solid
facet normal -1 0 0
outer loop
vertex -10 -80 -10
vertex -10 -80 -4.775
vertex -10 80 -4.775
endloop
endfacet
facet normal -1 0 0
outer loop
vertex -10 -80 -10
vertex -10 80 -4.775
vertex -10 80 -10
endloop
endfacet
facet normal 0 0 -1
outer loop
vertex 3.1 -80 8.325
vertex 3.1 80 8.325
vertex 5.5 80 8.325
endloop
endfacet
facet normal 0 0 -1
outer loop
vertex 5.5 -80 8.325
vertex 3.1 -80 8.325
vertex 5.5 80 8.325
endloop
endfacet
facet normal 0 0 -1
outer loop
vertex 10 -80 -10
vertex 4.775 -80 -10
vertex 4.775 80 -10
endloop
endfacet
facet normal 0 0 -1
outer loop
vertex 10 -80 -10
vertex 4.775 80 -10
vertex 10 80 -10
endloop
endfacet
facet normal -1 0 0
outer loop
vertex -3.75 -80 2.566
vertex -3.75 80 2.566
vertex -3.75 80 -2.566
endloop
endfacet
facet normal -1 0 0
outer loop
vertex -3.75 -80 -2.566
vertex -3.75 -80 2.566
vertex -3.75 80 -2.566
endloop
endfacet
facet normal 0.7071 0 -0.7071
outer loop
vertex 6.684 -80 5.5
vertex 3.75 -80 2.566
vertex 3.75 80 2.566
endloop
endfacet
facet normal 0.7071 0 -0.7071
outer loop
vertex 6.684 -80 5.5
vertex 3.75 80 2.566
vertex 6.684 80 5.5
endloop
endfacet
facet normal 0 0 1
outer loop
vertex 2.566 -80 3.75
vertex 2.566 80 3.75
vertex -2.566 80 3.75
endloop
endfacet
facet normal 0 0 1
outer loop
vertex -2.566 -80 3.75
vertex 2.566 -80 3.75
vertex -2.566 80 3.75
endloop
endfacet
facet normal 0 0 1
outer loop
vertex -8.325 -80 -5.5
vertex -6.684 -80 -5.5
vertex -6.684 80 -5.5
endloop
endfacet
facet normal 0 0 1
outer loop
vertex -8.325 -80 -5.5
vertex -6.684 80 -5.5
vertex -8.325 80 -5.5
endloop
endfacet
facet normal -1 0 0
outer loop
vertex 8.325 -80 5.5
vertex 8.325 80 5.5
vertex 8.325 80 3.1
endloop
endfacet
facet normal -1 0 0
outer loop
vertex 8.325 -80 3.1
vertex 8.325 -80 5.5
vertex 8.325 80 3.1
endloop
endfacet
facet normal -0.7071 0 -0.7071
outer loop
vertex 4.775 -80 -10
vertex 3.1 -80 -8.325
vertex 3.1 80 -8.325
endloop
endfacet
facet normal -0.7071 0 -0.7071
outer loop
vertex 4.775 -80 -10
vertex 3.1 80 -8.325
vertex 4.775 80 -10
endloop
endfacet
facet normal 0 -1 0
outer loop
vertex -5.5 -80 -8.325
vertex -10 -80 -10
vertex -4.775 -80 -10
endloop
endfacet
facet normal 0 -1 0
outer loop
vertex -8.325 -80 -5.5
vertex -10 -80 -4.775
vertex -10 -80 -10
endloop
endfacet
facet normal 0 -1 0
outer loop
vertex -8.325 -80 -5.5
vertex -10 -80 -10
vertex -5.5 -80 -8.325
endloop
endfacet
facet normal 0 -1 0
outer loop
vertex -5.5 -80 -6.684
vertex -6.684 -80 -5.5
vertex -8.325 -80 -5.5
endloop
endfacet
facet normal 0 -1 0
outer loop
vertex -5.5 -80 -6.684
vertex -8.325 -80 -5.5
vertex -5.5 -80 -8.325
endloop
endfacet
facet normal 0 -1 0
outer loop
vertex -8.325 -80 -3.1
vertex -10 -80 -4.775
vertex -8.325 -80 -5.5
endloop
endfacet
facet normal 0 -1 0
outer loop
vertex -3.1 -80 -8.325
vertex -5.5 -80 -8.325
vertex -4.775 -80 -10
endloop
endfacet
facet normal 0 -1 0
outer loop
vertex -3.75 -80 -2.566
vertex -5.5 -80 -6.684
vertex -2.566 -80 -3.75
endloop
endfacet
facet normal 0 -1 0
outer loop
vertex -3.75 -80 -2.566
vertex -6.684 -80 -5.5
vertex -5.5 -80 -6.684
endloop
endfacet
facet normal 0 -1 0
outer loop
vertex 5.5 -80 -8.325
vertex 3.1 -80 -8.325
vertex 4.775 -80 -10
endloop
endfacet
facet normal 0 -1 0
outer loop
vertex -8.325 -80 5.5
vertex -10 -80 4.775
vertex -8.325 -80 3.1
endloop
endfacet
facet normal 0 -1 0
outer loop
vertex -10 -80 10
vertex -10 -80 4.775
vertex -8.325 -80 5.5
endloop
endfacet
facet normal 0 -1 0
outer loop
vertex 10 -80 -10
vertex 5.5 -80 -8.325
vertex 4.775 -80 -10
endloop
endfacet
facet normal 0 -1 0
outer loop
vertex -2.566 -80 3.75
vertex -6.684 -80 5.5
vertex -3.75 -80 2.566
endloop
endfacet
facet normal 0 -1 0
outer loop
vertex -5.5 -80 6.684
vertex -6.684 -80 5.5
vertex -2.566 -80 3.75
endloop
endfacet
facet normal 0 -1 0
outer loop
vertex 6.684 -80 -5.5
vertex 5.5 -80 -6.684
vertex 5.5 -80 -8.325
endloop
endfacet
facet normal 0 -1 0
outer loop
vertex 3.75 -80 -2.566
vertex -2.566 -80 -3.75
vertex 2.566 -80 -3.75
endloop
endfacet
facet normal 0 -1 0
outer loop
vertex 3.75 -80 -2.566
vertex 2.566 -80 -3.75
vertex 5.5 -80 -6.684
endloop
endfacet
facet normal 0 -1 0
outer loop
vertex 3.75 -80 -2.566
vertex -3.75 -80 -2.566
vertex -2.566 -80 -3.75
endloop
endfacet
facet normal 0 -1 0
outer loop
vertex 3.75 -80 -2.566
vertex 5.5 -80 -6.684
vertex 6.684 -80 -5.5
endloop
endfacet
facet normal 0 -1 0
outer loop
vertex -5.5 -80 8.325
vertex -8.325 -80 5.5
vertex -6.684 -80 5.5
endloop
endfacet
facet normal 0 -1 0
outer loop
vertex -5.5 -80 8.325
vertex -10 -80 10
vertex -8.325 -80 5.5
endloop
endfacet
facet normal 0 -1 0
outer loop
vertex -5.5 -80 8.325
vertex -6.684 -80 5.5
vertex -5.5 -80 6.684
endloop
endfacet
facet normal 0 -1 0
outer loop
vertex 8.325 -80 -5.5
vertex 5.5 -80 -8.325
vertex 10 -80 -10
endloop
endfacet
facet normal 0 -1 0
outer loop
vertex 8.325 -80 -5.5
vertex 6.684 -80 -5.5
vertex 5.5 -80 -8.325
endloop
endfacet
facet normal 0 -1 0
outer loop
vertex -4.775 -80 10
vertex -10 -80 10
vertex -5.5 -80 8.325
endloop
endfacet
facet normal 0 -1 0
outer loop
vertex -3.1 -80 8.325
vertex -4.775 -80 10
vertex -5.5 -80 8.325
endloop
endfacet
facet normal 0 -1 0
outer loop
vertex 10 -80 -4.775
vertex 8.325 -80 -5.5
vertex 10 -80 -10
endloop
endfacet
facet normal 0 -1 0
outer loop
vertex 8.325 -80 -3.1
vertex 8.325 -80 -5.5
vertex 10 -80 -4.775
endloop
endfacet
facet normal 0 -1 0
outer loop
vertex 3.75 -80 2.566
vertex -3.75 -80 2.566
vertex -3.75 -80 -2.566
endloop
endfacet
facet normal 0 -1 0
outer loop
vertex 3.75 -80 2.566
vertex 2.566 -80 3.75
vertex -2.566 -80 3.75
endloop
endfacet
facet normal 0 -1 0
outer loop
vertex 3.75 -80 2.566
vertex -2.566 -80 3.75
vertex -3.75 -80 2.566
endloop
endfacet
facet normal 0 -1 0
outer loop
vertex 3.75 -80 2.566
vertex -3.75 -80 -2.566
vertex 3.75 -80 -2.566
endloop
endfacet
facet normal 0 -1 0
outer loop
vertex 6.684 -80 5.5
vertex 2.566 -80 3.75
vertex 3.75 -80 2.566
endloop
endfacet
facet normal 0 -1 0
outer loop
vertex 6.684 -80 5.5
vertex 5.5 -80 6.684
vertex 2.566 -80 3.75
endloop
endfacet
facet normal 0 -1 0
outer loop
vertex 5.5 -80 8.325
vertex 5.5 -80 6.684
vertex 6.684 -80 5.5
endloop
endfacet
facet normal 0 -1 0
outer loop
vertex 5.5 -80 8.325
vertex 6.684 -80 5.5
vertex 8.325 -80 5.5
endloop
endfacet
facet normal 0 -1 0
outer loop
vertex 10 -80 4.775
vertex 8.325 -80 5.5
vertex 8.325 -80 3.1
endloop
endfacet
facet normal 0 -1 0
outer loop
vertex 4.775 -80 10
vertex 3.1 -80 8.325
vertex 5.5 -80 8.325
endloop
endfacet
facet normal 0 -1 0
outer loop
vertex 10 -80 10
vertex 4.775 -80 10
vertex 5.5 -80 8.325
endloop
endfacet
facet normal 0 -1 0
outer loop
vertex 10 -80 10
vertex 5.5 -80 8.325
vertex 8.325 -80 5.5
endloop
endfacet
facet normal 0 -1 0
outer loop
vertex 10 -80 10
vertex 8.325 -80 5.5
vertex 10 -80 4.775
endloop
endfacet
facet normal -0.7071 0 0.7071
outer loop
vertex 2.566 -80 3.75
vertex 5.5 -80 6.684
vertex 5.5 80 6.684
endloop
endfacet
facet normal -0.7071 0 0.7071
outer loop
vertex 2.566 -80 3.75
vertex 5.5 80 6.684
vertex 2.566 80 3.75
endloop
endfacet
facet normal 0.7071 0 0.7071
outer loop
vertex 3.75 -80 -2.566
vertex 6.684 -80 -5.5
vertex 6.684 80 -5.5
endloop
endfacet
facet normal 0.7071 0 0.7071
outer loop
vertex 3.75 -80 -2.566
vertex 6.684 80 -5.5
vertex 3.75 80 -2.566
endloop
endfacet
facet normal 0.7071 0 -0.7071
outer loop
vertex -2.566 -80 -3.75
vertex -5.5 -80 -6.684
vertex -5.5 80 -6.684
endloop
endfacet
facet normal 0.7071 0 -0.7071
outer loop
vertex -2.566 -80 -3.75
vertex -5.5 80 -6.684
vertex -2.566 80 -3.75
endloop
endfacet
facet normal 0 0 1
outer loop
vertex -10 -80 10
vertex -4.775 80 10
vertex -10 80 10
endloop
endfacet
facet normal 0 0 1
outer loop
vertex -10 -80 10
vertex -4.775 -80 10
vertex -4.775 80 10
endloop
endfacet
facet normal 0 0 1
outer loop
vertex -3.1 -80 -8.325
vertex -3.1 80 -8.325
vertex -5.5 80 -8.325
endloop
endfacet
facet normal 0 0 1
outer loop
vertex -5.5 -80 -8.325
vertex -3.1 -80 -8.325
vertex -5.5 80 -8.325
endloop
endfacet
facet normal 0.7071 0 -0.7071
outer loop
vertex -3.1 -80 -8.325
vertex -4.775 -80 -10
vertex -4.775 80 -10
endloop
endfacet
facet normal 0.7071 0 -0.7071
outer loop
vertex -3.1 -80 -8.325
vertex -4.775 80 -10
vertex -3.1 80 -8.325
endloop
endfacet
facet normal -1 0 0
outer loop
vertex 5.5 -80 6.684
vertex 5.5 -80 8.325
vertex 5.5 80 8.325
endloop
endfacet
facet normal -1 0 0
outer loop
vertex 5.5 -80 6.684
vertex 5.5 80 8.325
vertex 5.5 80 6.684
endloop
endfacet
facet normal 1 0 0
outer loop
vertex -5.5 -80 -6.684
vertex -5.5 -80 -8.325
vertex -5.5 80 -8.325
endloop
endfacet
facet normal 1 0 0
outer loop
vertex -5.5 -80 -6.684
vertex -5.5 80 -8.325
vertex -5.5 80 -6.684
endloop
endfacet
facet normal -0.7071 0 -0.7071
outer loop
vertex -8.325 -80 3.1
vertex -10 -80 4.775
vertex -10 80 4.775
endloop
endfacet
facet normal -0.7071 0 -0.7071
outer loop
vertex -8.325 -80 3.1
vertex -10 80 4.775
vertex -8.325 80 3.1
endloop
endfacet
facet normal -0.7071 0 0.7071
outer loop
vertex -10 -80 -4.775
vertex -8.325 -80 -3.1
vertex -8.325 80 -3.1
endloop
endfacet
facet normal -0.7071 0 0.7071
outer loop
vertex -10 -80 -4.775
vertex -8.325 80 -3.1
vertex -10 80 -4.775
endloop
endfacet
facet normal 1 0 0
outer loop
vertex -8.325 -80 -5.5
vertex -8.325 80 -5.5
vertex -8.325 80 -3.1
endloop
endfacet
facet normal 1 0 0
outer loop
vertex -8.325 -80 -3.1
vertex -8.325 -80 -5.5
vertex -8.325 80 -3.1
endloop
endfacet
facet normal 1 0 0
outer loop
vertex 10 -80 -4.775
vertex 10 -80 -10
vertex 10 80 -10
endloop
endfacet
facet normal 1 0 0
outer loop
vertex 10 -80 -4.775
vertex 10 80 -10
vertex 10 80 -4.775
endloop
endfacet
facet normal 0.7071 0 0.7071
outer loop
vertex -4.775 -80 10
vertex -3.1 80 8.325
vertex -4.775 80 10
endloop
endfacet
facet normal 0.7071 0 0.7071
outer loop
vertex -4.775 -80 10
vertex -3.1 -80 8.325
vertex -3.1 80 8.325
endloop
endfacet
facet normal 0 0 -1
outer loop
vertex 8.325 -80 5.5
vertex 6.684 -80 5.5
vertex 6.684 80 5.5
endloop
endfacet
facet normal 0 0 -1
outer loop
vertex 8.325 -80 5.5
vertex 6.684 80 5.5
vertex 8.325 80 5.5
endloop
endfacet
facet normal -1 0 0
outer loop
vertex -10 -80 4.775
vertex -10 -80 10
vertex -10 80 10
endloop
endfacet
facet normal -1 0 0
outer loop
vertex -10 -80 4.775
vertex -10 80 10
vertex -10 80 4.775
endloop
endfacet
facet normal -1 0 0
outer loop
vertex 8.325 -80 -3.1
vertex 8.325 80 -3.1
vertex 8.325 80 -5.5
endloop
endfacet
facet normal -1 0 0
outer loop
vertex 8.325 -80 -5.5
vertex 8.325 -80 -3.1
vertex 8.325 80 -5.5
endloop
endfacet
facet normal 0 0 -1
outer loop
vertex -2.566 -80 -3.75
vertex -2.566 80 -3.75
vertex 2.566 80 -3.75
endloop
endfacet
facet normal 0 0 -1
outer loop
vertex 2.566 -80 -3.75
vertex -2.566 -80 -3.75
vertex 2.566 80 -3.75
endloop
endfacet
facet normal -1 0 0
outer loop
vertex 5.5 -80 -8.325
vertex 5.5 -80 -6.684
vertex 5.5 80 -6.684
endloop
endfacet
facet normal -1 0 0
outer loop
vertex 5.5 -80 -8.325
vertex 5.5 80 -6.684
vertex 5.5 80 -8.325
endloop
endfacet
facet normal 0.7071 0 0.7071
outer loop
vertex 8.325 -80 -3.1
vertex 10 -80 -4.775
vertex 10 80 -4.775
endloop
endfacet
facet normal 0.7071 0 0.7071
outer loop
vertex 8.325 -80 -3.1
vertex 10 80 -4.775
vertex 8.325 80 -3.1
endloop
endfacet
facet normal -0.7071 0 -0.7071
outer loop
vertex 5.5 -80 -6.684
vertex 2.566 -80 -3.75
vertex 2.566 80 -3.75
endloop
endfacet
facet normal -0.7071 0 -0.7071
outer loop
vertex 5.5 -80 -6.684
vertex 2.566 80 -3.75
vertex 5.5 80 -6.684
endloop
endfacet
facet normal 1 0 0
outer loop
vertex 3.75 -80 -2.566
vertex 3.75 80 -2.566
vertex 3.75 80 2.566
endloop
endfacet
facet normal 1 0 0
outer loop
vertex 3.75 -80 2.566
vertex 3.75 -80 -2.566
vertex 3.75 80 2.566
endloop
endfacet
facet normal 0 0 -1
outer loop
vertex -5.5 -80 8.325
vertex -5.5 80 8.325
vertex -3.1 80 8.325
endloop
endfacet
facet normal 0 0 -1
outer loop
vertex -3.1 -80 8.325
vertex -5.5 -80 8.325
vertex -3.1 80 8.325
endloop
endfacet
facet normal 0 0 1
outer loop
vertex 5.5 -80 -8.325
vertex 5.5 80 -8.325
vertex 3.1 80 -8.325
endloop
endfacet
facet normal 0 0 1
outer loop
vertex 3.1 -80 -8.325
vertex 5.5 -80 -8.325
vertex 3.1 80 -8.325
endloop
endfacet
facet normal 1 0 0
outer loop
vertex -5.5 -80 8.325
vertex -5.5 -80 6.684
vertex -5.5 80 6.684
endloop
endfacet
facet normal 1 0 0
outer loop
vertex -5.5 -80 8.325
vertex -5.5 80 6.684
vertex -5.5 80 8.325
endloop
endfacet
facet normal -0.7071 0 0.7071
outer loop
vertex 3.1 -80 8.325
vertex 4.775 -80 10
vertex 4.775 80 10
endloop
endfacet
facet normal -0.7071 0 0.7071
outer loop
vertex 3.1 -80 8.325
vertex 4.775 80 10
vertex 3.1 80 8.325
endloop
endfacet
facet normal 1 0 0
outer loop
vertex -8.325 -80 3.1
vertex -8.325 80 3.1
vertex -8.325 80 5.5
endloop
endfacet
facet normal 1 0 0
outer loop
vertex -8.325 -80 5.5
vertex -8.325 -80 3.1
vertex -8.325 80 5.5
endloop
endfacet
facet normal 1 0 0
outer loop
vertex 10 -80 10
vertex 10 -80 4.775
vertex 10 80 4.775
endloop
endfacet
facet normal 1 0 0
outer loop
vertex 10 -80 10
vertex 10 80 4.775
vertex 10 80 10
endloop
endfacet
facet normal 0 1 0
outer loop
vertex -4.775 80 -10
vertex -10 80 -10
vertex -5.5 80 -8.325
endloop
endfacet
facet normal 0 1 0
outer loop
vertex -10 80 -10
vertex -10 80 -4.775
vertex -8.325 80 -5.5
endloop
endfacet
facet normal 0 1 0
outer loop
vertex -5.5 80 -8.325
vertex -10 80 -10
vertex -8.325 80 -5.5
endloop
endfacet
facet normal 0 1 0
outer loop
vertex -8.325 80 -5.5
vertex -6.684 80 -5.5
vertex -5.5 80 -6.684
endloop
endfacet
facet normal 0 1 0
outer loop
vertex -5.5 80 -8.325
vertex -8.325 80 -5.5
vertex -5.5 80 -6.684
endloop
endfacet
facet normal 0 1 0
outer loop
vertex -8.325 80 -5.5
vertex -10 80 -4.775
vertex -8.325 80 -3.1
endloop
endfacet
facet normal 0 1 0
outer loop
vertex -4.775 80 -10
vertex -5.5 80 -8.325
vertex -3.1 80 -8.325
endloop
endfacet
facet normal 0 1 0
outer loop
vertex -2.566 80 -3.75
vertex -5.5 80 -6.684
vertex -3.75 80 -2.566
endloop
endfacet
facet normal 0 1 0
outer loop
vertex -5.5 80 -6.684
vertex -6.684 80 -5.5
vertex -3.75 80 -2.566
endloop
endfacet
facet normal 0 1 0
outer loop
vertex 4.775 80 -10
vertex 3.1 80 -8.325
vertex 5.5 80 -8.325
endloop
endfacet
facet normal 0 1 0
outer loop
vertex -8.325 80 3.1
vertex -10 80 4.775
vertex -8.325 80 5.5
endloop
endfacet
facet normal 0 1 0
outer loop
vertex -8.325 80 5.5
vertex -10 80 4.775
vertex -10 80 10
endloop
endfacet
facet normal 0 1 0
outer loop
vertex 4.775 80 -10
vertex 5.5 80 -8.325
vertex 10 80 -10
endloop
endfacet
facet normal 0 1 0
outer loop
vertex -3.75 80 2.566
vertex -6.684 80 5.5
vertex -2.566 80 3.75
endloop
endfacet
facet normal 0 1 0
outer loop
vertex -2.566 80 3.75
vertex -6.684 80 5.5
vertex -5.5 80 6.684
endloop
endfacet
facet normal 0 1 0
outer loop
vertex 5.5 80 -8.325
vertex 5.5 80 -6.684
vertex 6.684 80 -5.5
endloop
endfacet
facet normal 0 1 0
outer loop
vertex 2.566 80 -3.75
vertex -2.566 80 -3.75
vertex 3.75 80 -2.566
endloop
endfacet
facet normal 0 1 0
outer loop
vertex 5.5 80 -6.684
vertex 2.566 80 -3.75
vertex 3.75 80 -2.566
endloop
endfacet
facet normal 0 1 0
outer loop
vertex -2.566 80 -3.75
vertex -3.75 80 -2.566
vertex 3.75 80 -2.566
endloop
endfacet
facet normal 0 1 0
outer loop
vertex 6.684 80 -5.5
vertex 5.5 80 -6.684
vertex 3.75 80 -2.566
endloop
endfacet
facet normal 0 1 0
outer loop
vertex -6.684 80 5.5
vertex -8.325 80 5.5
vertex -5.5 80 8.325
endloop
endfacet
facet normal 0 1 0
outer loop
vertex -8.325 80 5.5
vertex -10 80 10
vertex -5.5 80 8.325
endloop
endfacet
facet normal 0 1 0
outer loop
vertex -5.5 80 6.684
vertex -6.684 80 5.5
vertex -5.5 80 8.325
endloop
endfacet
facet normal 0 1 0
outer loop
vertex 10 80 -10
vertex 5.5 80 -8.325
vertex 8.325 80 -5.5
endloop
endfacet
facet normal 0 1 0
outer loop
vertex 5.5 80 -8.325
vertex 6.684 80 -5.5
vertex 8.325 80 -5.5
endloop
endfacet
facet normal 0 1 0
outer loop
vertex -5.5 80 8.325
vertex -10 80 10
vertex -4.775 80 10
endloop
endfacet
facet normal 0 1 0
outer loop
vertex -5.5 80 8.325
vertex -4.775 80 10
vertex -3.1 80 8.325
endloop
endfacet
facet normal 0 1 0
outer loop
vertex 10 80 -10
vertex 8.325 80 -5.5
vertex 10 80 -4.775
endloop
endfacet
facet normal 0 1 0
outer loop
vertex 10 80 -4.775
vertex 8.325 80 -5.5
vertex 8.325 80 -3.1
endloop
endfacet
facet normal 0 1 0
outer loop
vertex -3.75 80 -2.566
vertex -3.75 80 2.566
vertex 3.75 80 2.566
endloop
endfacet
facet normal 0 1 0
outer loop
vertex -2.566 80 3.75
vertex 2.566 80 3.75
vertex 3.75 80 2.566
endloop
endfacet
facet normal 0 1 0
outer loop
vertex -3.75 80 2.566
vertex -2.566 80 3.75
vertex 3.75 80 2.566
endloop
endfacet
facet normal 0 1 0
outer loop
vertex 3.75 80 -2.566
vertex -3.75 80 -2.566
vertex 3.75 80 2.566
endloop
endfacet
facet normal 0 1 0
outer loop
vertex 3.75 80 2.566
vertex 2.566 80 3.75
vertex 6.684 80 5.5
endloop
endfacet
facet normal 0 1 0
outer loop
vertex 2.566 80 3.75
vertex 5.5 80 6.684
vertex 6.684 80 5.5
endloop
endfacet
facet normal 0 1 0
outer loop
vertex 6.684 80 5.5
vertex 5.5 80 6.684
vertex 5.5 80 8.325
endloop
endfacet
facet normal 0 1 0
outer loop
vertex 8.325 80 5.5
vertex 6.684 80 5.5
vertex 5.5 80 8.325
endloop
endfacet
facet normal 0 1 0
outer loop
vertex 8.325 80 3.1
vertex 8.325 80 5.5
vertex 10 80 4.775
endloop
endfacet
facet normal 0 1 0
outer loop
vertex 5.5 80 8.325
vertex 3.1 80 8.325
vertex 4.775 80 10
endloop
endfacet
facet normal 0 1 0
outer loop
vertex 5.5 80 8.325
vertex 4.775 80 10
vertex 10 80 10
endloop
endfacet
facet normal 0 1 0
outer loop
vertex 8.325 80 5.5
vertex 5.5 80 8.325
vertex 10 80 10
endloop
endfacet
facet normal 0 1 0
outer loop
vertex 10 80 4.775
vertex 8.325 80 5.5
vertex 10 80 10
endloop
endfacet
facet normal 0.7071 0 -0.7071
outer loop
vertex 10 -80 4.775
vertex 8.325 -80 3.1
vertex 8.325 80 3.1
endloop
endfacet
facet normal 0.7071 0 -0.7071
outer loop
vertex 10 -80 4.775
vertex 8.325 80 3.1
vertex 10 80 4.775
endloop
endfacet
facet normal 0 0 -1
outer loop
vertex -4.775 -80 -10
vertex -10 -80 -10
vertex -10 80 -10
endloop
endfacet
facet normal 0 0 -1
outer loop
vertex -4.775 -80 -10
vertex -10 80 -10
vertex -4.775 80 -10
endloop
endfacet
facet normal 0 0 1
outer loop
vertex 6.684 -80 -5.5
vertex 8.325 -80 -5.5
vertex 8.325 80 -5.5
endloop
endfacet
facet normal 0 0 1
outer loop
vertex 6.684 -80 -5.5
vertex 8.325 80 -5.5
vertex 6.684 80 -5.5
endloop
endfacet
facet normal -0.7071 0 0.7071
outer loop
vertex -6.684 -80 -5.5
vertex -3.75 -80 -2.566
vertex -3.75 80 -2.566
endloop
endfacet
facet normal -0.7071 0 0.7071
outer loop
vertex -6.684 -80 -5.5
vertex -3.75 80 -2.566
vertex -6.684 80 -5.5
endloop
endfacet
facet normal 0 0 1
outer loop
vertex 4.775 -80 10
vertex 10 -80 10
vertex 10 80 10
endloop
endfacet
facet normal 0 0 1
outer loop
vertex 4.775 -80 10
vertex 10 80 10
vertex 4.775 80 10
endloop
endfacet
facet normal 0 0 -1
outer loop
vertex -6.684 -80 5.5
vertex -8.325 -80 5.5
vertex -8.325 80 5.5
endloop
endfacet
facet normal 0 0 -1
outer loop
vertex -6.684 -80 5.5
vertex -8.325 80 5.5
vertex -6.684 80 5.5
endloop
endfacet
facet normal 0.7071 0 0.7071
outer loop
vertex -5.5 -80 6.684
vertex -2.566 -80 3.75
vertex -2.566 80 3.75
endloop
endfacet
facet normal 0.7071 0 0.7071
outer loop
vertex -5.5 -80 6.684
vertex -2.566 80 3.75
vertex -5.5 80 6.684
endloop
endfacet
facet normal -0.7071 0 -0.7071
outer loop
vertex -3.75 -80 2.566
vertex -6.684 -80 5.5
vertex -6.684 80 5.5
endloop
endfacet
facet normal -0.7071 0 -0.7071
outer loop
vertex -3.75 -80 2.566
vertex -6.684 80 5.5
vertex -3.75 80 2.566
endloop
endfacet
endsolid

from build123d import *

# Parameters (mm, degrees)
F1_DEPTH = 80


with BuildPart() as f1:
    # F0 (on Front) → F1 (new body, symmetric)
    with BuildSketch(Plane.XZ):
        Polygon((-4.775, 10), (-10, 10), (-10, 4.775), (-8.325, 3.1), (-8.325, 5.5), (-6.684404, 5.5), (-3.75, 2.565596), (-3.75, 0), (-3.75, -2.565596), (-6.684404, -5.5), (-8.325, -5.5), (-8.325, -3.1), (-10, -4.775), (-10, -10), (-4.775, -10), (-3.1, -8.325), (-5.5, -8.325), (-5.5, -6.684404), (-2.565596, -3.75), (0, -3.75), (2.565596, -3.75), (5.5, -6.684404), (5.5, -8.325), (3.1, -8.325), (4.775, -10), (10, -10), (10, -4.775), (8.325, -3.1), (8.325, -5.5), (6.684404, -5.5), (3.75, -2.565596), (3.75, 0), (3.75, 2.565596), (6.684404, 5.5), (8.325, 5.5), (8.325, 3.1), (10, 4.775), (10, 10), (4.775, 10), (3.1, 8.325), (5.5, 8.325), (5.5, 6.684404), (2.565596, 3.75), (0, 3.75), (-2.565596, 3.75), (-5.5, 6.684404), (-5.5, 8.325), (-3.1, 8.325), align=None)
    extrude(amount=F1_DEPTH, both=True)


solid = f1.part
